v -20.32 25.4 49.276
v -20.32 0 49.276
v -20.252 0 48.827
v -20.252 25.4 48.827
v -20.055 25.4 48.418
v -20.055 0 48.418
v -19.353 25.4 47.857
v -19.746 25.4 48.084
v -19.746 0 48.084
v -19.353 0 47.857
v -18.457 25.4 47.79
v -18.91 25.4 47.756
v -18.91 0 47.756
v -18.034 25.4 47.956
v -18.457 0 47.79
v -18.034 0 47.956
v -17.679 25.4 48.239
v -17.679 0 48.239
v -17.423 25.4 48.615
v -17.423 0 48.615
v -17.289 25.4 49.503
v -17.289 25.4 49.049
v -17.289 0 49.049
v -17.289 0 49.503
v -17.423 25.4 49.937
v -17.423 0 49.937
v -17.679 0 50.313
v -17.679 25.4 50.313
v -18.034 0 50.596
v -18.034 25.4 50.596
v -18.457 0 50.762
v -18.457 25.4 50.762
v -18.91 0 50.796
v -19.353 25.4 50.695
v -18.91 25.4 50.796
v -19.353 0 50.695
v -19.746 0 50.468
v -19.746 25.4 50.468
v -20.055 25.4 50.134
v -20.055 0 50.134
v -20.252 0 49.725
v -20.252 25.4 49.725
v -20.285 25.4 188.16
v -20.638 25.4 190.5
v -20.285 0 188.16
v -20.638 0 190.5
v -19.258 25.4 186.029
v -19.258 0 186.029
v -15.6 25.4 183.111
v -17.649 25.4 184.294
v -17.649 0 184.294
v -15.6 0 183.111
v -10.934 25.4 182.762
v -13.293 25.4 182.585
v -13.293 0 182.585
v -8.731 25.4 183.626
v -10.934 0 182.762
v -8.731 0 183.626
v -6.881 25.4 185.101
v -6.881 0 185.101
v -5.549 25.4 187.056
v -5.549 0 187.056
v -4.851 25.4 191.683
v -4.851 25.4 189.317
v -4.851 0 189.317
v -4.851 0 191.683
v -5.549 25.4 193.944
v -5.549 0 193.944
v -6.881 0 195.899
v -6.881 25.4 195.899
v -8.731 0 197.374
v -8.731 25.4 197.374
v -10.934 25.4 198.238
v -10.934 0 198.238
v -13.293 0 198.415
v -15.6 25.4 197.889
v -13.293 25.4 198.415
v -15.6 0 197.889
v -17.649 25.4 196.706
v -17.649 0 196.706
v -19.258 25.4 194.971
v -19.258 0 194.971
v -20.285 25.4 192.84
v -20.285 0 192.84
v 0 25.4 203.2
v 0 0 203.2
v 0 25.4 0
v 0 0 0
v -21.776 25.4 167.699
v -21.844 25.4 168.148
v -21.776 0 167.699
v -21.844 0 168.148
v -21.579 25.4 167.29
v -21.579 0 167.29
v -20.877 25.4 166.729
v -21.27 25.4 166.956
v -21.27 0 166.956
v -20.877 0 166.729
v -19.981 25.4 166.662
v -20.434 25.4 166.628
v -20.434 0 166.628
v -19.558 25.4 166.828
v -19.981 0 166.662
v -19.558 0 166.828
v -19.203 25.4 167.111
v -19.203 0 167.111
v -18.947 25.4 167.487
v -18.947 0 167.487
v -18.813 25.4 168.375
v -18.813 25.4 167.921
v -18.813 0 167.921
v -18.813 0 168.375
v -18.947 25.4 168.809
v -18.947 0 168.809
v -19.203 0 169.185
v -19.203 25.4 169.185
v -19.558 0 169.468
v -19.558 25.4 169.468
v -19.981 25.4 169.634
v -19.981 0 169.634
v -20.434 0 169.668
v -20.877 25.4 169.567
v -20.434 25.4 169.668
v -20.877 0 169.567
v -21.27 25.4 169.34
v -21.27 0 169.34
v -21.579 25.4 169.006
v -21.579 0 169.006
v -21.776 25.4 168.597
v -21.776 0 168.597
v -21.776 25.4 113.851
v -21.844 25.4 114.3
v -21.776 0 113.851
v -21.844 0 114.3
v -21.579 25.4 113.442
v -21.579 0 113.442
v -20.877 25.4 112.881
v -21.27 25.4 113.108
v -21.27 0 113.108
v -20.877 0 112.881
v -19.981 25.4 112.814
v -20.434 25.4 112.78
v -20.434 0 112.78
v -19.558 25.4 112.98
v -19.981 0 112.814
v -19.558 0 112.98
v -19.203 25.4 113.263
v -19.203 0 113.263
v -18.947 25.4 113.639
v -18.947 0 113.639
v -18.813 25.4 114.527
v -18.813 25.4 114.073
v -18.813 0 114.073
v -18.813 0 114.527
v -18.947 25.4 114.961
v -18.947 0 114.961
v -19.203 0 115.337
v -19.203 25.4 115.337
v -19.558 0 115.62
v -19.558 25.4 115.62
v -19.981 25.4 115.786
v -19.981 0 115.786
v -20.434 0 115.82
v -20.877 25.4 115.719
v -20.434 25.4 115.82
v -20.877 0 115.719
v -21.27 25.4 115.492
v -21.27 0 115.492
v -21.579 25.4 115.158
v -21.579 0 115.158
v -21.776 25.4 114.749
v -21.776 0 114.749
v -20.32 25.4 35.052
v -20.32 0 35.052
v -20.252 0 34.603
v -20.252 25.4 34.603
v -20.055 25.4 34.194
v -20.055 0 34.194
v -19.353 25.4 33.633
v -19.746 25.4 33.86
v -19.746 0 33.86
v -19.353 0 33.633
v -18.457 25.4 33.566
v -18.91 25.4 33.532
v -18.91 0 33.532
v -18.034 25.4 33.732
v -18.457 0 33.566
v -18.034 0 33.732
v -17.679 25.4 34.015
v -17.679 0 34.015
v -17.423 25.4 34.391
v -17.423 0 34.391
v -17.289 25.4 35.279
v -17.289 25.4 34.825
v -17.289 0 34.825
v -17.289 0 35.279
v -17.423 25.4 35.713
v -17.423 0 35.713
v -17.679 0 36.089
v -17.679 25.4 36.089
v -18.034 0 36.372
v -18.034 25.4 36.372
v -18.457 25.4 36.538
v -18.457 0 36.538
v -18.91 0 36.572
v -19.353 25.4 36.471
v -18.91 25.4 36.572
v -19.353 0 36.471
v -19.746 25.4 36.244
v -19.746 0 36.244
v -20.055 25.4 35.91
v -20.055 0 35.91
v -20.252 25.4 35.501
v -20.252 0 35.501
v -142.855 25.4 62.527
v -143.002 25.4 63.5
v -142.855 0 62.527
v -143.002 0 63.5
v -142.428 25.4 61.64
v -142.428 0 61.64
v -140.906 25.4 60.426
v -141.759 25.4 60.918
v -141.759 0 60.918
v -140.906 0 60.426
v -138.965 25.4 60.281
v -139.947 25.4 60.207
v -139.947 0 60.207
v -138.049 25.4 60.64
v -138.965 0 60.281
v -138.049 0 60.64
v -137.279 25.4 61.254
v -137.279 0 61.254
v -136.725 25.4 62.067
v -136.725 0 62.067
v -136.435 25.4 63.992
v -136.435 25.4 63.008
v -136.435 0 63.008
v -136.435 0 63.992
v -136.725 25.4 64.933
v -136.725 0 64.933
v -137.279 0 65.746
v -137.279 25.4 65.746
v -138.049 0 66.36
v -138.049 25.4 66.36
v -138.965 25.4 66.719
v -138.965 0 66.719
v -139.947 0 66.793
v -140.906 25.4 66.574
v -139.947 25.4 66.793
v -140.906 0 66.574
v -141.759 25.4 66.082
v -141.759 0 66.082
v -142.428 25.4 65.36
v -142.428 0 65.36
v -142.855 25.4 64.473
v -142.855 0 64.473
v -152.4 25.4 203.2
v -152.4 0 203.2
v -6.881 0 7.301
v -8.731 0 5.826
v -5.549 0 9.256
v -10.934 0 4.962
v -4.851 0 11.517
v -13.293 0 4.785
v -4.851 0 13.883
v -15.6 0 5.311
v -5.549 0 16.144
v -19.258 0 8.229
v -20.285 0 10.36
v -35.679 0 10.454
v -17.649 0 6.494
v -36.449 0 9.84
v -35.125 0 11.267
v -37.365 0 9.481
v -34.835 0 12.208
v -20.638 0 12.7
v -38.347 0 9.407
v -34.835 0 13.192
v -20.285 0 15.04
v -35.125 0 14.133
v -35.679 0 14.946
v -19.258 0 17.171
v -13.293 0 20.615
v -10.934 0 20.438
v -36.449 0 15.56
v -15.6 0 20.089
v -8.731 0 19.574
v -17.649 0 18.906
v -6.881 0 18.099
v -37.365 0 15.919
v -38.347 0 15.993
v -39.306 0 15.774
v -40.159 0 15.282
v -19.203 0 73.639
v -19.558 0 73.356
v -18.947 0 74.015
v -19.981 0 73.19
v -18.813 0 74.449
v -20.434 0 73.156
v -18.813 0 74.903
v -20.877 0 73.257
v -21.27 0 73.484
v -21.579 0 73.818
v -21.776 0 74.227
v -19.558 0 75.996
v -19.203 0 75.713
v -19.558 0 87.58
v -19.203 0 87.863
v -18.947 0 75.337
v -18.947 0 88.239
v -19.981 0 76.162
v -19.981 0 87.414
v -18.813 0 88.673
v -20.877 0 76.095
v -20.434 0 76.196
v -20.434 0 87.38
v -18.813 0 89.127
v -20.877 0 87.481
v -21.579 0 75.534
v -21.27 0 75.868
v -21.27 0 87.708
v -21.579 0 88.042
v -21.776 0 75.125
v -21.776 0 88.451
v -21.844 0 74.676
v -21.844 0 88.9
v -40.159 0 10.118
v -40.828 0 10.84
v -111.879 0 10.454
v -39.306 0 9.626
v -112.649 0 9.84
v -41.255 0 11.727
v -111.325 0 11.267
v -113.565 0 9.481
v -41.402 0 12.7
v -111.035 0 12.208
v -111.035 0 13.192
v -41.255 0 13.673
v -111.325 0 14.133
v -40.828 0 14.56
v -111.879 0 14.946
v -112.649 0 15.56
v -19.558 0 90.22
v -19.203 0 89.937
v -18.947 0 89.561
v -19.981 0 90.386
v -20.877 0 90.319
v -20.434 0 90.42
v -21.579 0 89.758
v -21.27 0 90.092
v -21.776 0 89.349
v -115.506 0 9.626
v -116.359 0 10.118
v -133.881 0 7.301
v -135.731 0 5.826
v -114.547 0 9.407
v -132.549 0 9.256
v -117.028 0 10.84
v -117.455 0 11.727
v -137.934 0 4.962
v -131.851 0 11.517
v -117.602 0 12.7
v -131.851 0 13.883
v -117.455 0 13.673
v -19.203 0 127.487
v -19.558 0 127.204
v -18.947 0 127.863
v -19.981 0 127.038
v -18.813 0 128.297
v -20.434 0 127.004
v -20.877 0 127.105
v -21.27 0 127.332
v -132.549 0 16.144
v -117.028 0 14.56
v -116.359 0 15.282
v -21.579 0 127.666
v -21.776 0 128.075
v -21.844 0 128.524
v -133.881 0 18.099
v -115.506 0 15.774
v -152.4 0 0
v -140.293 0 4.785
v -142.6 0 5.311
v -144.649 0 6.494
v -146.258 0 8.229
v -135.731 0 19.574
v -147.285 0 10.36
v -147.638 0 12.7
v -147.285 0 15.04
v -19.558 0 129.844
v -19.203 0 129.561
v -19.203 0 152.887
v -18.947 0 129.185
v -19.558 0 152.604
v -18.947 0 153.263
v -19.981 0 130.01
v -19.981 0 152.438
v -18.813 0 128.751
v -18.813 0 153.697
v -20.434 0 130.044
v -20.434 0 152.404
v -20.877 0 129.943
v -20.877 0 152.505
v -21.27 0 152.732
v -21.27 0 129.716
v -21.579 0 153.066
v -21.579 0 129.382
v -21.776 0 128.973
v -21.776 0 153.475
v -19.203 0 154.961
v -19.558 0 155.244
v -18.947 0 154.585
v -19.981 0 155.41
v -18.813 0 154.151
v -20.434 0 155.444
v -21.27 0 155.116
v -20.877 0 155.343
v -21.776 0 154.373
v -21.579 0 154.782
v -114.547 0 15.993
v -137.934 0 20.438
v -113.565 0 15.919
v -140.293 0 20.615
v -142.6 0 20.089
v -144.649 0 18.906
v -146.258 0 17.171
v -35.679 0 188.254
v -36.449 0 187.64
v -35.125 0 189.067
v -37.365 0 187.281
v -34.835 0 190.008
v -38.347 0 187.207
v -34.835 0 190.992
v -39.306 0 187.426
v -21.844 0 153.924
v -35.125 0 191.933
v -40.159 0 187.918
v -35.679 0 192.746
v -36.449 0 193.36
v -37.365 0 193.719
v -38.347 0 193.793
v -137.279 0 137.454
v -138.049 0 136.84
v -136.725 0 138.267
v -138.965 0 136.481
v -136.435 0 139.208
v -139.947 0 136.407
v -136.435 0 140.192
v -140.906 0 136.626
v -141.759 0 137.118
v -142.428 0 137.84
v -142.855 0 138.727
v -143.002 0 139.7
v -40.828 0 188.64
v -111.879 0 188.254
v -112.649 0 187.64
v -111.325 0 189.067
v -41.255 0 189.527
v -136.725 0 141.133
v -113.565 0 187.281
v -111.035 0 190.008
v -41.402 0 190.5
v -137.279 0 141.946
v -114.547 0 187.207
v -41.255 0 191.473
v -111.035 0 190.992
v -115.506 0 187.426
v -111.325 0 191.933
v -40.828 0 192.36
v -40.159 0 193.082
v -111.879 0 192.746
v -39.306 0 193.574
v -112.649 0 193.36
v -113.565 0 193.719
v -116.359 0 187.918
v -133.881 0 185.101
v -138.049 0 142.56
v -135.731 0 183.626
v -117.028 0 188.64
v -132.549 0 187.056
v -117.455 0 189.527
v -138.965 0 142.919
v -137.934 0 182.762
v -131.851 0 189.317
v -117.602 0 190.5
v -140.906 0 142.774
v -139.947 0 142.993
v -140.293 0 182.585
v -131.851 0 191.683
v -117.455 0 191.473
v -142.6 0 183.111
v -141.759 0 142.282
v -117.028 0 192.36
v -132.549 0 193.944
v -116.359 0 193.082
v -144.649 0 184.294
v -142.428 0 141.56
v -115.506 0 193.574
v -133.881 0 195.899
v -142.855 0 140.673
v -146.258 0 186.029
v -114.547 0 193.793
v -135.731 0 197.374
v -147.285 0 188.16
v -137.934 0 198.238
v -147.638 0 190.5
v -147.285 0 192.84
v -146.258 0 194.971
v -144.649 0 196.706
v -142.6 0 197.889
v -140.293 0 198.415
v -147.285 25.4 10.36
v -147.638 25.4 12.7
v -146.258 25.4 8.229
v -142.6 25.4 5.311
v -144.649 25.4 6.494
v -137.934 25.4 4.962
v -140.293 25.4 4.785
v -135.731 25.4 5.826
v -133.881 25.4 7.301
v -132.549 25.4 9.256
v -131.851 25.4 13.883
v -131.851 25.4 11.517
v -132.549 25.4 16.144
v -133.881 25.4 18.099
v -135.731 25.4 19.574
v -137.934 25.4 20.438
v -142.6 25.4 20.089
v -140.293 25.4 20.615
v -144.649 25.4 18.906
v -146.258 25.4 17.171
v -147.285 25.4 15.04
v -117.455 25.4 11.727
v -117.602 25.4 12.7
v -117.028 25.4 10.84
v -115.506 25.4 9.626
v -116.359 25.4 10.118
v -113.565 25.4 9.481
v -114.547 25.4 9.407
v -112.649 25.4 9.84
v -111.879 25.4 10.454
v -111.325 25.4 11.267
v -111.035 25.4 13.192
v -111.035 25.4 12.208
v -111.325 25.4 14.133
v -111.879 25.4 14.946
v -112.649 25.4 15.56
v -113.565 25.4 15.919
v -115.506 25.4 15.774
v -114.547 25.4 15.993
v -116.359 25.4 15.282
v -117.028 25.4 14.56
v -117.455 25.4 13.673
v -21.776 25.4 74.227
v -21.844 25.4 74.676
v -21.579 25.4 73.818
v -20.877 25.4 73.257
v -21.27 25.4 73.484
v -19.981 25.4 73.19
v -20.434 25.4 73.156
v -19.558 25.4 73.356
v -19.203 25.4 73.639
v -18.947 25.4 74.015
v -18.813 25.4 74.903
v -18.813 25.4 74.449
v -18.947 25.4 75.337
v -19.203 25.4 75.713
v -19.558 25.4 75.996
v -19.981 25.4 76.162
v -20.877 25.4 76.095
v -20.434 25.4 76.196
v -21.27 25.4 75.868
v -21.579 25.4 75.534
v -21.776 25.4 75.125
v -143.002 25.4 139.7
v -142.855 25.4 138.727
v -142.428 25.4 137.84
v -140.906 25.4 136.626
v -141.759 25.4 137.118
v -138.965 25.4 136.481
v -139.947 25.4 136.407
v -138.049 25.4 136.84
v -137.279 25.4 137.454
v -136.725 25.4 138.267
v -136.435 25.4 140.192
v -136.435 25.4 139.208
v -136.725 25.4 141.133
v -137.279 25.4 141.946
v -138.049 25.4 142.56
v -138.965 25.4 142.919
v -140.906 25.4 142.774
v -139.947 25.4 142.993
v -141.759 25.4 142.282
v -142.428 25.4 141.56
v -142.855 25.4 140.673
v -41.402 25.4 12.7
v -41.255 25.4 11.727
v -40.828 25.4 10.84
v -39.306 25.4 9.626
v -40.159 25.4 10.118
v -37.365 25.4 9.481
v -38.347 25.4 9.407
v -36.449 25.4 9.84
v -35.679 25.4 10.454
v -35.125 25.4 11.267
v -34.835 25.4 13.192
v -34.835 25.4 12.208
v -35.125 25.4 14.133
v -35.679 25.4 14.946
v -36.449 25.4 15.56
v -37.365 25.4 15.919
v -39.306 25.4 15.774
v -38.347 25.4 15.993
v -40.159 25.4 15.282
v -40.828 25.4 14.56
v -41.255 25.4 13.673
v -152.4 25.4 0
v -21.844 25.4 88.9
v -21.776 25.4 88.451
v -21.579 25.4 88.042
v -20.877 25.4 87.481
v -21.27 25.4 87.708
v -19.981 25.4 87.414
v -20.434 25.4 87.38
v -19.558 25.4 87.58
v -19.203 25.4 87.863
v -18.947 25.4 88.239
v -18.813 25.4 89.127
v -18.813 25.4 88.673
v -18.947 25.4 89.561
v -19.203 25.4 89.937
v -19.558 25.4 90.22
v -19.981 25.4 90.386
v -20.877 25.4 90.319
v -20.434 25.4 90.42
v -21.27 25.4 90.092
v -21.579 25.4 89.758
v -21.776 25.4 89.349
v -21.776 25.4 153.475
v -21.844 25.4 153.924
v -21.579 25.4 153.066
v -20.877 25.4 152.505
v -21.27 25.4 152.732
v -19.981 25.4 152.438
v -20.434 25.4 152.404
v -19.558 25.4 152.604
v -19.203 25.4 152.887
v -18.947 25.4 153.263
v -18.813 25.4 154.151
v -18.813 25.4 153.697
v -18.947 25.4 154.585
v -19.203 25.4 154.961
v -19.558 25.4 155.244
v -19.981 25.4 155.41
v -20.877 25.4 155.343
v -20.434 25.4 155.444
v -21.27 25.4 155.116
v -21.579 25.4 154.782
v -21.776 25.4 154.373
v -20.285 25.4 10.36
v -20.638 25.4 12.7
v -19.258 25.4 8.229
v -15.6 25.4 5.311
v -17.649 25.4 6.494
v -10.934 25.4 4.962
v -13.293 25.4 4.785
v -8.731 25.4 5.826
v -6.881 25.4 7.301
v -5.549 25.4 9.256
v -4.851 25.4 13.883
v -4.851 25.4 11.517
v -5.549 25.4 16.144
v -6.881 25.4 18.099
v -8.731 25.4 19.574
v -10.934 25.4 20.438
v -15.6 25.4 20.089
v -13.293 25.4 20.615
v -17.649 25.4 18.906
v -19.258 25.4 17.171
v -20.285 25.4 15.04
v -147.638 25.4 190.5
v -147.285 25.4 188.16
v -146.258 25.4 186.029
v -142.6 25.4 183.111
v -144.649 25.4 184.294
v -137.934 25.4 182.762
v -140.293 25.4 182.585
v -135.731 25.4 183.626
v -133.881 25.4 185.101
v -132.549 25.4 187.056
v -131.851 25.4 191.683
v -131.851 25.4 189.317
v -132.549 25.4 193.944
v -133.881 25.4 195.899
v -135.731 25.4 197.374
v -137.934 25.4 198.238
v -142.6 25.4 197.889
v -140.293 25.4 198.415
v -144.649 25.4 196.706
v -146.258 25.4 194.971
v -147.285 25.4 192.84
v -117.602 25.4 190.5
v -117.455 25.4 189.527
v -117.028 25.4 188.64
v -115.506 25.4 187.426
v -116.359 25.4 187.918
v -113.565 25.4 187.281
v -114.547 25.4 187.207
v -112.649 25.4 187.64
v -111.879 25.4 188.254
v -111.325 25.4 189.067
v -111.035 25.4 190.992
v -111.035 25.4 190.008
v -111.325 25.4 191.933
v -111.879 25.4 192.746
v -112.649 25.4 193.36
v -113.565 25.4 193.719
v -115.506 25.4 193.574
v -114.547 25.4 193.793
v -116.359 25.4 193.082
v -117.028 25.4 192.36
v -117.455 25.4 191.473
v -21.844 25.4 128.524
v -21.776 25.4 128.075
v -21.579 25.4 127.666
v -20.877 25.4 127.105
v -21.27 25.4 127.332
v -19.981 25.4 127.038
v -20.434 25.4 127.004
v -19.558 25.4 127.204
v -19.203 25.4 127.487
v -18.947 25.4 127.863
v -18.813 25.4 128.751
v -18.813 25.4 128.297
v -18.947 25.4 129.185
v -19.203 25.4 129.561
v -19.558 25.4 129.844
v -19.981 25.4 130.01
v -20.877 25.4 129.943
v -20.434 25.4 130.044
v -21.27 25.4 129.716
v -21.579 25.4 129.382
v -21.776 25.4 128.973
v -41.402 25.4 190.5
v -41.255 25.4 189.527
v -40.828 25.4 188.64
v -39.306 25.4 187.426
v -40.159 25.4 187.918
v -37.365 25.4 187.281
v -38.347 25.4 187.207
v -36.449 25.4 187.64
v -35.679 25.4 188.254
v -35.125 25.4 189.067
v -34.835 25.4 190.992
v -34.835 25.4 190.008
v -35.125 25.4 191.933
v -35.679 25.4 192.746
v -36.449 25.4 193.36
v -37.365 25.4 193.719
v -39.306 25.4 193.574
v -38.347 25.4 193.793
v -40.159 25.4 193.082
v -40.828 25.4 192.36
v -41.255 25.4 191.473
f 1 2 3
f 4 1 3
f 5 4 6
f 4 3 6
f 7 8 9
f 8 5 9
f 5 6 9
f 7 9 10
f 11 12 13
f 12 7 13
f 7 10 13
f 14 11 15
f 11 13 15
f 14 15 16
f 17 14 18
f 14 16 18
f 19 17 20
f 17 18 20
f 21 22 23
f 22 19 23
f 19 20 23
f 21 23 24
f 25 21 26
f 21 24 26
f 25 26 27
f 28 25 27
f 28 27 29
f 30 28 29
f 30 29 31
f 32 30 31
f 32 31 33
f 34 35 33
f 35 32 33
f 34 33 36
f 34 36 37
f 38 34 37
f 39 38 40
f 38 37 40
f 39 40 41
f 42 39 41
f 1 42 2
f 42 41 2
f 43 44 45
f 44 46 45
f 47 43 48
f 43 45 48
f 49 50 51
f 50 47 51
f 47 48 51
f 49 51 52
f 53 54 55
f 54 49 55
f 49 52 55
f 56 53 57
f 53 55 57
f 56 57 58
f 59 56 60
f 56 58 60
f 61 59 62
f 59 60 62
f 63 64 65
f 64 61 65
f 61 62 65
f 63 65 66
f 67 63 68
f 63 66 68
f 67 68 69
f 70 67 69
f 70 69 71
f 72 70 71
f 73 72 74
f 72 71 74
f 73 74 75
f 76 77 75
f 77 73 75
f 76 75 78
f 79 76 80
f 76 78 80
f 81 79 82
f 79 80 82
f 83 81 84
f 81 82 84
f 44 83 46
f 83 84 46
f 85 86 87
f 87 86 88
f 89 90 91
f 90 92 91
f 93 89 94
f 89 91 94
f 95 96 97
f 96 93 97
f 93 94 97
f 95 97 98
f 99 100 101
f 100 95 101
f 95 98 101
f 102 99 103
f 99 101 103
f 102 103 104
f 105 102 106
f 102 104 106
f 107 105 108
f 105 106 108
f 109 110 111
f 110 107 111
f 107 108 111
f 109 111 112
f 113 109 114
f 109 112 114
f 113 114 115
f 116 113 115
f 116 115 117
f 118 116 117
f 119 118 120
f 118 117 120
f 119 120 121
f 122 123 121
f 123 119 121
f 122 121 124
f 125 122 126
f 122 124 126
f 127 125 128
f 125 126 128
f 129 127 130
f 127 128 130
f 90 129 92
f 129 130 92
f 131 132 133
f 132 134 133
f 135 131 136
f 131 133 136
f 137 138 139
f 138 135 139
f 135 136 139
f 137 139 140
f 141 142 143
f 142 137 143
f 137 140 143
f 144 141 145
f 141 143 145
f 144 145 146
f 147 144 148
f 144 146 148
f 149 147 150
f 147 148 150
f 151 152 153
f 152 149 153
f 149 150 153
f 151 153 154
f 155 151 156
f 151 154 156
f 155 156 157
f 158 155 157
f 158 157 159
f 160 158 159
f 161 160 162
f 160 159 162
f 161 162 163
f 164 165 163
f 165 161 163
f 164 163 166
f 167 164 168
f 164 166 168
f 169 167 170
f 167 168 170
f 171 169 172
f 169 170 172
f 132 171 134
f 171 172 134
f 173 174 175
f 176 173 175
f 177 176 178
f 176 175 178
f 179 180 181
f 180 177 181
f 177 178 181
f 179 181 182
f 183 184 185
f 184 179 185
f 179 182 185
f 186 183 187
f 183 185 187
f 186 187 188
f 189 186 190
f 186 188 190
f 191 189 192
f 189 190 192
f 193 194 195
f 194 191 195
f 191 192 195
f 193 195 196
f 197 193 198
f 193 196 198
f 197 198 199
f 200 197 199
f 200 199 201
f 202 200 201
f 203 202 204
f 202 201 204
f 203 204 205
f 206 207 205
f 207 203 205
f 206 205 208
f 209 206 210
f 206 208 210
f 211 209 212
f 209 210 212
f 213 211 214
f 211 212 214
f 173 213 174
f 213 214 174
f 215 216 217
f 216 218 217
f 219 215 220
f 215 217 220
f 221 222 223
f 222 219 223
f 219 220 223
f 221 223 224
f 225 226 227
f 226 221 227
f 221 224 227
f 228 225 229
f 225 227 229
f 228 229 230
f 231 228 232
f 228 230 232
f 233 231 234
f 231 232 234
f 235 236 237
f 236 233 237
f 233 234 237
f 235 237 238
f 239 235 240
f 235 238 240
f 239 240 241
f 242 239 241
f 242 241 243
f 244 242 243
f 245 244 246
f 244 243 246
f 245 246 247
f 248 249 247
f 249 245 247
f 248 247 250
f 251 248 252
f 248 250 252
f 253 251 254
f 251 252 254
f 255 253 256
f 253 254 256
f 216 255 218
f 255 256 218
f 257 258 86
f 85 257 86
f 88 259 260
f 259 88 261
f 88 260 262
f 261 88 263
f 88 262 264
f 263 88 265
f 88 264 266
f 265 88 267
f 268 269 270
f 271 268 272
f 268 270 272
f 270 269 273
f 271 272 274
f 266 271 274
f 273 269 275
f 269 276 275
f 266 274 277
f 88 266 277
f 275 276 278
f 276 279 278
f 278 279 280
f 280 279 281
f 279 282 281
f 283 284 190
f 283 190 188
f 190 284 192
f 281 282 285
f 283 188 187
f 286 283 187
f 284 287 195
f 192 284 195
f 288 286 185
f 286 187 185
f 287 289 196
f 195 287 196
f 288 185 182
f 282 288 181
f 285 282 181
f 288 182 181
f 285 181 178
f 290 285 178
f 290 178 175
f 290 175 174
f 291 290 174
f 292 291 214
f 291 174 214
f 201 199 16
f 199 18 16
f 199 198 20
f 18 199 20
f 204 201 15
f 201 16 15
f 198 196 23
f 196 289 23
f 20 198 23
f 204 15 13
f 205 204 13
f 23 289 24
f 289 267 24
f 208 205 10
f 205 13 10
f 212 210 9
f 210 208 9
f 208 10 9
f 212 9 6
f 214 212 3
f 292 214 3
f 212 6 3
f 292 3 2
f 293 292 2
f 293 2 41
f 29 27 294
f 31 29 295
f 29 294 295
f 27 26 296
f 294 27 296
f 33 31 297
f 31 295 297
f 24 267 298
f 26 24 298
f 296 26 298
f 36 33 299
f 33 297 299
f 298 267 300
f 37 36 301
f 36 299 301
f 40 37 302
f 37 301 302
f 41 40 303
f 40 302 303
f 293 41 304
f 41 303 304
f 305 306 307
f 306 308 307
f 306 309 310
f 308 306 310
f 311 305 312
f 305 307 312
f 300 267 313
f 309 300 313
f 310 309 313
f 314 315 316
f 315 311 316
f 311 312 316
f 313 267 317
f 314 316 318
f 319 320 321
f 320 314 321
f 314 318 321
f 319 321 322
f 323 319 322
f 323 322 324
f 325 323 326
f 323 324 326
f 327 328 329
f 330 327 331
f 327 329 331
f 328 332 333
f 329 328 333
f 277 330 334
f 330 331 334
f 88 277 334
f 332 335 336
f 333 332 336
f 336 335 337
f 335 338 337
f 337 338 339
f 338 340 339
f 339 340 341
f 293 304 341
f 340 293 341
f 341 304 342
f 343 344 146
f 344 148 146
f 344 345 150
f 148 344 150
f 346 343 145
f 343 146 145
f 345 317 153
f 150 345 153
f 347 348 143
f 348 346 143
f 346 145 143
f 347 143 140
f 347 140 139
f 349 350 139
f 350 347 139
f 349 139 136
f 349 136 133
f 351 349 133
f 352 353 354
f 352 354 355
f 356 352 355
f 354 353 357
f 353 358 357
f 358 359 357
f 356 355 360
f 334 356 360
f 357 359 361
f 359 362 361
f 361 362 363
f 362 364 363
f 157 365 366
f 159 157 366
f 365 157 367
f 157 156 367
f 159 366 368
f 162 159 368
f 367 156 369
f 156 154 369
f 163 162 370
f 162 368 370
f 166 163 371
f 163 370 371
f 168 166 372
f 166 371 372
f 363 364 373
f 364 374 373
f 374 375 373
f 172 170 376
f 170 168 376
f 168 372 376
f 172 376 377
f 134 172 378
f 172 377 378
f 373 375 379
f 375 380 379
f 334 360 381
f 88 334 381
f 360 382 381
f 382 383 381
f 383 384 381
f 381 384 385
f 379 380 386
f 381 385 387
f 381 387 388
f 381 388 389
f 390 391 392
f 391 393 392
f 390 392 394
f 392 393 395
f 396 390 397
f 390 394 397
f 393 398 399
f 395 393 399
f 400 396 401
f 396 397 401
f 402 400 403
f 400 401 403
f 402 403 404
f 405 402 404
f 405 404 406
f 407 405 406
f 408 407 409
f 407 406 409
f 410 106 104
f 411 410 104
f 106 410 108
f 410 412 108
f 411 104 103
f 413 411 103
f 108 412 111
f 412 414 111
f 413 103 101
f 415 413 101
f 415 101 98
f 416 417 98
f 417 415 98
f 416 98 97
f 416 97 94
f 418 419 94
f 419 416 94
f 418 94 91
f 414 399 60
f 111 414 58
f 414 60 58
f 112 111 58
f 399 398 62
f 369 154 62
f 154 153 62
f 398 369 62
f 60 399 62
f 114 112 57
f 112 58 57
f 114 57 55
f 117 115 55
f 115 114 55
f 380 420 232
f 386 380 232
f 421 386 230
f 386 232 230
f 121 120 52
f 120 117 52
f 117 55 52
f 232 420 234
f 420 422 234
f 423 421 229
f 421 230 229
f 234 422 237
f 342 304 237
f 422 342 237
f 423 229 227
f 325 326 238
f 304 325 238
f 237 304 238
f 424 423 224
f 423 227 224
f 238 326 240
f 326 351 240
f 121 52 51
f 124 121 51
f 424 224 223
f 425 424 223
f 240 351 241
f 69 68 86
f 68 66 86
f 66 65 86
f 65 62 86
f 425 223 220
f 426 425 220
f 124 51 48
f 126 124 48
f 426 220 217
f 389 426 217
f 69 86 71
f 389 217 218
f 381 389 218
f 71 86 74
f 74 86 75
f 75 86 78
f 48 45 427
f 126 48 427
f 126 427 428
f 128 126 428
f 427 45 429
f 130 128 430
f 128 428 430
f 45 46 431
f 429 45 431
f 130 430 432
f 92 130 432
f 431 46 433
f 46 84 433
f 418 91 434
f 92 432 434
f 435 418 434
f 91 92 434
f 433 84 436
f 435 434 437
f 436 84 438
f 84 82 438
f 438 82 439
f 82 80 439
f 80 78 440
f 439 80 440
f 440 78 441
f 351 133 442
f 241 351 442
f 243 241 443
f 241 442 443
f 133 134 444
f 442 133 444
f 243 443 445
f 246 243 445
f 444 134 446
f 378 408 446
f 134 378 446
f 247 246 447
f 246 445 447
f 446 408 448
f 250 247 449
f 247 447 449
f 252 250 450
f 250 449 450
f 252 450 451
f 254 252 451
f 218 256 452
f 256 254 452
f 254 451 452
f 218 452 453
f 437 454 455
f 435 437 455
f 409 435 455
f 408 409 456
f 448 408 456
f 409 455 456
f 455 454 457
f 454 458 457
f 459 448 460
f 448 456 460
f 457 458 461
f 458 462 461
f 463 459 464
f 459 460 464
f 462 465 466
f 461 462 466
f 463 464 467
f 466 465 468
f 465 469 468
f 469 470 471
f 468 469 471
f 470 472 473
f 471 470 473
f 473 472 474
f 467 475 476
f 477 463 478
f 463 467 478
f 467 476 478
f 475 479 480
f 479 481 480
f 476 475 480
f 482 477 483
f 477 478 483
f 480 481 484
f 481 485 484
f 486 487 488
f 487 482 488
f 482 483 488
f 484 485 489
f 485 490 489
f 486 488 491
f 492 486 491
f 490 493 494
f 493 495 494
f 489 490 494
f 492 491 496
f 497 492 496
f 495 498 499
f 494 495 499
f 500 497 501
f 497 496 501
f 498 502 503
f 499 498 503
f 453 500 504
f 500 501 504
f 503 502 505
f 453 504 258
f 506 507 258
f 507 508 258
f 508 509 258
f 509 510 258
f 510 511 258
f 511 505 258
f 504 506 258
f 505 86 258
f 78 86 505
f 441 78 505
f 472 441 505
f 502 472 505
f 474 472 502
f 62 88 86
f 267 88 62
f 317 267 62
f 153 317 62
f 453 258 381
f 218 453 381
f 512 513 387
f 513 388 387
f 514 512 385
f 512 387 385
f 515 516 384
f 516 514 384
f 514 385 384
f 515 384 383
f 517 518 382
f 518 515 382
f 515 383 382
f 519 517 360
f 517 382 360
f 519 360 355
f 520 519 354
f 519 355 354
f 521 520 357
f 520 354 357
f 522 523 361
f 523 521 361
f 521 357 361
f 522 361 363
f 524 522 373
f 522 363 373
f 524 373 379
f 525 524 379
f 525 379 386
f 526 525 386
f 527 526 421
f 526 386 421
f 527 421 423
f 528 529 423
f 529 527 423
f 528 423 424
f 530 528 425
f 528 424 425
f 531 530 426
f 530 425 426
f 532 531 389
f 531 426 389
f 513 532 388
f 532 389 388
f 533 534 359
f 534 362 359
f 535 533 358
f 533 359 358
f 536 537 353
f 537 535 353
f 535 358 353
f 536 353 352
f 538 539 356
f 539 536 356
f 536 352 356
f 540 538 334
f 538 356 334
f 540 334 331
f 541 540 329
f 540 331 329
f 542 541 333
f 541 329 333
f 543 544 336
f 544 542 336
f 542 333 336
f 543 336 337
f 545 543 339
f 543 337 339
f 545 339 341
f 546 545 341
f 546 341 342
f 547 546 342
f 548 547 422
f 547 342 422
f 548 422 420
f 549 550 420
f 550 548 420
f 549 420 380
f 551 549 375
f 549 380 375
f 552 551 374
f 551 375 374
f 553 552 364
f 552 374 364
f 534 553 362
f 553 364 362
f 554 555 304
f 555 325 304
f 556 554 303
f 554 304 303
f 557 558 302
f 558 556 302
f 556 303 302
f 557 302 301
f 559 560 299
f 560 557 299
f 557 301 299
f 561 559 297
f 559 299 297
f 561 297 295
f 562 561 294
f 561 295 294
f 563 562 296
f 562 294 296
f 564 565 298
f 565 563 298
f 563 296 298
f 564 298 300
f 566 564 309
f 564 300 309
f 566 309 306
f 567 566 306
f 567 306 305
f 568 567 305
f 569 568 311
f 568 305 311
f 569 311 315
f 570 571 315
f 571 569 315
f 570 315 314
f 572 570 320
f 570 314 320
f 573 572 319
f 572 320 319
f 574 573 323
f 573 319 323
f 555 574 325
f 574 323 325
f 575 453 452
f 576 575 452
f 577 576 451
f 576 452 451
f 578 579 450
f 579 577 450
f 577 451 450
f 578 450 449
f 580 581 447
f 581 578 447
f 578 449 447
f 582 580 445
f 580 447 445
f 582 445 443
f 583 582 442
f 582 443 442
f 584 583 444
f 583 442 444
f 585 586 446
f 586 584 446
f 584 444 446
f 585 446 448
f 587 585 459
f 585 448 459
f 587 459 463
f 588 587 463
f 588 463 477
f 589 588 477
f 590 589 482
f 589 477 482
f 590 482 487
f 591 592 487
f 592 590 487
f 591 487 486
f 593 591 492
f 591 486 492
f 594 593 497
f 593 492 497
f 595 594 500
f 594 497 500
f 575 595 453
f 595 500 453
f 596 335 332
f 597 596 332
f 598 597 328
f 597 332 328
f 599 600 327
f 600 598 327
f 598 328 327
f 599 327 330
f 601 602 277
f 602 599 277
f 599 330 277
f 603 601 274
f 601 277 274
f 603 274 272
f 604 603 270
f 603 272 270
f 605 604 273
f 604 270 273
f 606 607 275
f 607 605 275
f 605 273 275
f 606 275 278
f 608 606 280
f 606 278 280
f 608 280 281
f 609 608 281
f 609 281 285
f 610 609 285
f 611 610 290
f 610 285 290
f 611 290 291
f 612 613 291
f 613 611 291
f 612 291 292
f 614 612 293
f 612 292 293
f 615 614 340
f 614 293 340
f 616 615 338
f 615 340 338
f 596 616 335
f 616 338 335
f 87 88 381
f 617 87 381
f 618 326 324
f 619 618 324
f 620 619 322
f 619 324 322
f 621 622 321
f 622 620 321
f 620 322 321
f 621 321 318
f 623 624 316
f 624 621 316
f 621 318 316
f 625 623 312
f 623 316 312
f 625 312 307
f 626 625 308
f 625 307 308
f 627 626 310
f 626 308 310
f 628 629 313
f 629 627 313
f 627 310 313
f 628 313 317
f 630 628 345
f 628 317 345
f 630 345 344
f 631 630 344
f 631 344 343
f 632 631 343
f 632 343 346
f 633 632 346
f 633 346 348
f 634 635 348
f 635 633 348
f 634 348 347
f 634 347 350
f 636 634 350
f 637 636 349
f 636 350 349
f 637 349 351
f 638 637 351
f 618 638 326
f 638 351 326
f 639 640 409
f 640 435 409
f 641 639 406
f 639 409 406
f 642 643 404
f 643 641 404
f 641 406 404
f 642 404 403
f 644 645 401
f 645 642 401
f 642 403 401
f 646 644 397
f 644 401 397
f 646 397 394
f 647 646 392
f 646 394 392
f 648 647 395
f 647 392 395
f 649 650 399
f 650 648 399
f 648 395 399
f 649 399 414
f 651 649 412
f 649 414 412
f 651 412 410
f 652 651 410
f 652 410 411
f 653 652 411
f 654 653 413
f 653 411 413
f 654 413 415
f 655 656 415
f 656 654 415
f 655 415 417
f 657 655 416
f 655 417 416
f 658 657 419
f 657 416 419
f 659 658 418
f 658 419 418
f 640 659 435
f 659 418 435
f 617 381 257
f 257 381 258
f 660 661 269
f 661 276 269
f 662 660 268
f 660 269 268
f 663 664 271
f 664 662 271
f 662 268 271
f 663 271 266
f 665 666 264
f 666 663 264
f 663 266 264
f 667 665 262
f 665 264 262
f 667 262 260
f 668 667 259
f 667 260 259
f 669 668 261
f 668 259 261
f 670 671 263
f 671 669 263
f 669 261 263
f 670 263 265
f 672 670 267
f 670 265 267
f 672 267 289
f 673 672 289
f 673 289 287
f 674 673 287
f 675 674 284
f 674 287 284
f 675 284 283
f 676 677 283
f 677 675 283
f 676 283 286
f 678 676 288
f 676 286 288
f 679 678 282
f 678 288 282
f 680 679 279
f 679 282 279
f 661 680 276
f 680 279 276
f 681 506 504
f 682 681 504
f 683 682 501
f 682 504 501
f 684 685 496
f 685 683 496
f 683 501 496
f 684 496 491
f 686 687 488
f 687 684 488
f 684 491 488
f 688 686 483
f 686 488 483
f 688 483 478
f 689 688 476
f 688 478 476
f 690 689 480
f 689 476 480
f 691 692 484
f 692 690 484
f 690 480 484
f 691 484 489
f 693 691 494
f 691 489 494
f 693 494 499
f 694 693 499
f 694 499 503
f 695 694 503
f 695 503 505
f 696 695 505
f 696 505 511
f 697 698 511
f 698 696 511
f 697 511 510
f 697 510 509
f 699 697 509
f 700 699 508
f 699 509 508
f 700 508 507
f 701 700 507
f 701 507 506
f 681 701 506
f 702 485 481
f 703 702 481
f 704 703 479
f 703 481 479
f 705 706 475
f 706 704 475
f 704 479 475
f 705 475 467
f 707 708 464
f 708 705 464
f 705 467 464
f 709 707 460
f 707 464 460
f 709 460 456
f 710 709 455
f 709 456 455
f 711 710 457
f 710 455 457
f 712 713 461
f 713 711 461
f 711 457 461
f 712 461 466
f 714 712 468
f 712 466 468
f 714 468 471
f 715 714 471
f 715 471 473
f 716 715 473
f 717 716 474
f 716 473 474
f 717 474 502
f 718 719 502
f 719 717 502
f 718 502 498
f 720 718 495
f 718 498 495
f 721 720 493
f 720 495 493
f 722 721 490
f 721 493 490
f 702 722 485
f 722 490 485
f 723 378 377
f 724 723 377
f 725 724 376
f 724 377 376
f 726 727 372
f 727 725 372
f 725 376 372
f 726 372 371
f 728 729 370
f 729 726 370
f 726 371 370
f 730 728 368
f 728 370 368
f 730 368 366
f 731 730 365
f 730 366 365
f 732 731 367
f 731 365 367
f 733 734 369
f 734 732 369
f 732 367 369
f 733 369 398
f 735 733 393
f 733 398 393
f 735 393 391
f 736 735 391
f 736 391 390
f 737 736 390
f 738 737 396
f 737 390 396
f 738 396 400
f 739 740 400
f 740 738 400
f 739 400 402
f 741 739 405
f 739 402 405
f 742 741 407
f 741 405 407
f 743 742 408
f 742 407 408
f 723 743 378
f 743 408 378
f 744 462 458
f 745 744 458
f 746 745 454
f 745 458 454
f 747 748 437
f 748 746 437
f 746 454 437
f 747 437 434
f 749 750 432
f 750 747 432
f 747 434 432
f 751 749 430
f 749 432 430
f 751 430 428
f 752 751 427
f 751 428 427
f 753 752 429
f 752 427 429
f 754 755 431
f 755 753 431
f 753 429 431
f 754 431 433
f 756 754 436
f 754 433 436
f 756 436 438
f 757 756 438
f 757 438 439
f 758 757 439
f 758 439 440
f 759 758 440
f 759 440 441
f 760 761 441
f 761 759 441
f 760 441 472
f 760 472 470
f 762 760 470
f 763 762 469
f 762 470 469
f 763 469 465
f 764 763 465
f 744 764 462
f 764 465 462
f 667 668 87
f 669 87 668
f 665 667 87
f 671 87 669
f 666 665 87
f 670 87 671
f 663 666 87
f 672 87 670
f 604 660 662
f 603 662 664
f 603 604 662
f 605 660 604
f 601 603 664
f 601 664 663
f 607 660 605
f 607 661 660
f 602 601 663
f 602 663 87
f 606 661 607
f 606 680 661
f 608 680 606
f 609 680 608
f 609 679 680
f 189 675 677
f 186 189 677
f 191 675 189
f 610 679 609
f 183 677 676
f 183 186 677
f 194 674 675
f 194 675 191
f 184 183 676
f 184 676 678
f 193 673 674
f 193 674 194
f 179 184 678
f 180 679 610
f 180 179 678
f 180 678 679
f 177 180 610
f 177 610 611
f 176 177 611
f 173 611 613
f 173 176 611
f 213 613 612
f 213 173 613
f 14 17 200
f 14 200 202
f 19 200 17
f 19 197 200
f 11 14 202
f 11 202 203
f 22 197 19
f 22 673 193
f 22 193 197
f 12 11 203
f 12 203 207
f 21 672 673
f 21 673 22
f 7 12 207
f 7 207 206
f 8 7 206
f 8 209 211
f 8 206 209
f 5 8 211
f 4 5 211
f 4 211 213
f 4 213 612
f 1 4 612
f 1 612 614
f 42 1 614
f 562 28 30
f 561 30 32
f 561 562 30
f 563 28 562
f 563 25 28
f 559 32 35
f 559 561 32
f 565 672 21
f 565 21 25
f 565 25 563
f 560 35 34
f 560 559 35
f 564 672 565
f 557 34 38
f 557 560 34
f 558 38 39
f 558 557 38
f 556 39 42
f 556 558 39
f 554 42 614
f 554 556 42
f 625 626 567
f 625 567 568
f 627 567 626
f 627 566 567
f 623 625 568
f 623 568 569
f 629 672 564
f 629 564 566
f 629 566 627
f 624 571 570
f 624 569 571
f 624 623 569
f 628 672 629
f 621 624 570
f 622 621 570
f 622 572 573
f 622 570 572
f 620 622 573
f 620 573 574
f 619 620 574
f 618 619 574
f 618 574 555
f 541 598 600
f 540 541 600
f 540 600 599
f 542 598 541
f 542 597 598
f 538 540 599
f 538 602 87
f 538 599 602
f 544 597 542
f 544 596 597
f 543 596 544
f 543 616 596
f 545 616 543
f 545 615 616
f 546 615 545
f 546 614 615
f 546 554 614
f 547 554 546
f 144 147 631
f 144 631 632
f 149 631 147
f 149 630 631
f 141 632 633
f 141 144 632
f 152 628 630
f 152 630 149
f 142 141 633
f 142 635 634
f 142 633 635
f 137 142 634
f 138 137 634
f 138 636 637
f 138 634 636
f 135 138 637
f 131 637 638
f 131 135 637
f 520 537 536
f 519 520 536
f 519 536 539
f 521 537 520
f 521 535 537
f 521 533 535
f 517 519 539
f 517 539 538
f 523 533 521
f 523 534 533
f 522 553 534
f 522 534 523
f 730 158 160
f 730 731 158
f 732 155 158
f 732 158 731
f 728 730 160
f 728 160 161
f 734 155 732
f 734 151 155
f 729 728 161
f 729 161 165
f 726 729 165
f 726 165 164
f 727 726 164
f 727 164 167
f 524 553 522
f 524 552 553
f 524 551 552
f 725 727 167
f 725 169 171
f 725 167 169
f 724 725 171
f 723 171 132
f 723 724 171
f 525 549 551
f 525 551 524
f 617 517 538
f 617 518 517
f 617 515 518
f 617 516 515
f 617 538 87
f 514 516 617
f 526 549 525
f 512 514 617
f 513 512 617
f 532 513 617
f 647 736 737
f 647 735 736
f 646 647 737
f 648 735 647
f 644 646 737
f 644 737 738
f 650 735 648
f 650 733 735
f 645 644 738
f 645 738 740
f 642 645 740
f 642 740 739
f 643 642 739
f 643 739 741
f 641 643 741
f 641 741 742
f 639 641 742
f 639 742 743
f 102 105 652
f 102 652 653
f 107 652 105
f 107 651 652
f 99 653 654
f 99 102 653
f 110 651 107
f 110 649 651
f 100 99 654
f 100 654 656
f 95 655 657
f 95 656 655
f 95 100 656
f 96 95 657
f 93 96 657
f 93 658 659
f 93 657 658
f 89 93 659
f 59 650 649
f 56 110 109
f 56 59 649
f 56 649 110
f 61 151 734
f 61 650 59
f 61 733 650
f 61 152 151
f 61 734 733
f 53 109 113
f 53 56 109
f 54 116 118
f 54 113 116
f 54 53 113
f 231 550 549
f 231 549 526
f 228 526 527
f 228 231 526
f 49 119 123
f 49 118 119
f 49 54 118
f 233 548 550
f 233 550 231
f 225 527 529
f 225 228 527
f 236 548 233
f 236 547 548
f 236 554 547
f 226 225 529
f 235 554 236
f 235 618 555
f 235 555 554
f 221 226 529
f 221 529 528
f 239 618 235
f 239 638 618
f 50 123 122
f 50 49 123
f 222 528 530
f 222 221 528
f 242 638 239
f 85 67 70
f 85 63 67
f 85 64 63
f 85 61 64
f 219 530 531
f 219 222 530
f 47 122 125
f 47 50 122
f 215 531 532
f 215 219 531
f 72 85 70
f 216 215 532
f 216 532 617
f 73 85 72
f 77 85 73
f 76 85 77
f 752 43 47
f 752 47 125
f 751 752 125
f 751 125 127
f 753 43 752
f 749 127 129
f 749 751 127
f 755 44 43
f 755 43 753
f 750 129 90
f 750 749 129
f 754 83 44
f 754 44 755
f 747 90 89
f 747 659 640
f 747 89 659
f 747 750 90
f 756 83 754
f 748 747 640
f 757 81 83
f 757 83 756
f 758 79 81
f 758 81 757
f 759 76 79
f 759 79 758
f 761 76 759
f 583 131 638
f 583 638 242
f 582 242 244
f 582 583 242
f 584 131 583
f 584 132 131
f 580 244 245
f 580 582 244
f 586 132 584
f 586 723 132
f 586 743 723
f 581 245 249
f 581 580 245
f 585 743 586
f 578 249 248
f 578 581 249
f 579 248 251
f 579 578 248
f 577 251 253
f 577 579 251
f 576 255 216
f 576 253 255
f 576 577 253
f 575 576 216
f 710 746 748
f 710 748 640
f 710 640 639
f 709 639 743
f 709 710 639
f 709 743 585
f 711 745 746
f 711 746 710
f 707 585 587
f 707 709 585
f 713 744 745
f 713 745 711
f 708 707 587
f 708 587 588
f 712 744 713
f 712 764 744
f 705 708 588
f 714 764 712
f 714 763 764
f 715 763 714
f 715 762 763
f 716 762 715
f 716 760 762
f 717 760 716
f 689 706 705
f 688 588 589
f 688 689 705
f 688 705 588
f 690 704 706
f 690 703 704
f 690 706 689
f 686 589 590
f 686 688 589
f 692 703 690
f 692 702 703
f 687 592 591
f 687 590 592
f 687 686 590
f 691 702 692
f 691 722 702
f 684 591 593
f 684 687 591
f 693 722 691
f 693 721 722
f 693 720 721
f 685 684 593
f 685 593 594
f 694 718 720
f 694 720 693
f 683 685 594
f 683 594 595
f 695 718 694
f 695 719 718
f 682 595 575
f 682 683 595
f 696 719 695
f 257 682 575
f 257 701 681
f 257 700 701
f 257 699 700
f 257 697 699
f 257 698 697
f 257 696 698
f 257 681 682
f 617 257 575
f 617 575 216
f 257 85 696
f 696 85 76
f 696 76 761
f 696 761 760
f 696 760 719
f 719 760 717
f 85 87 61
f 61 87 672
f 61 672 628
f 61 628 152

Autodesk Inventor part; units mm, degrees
ref_plane "YZ Plane" through (0, 0, 0) normal (1, 0, 0) x (0, 1, 0)
ref_plane "XZ Plane" through (0, 0, 0) normal (0, 1, 0) x (-1, 0, 0)
ref_plane "XY Plane" through (0, 0, 0) normal (0, 0, 1) x (1, 0, 0)
sketch "Sketch1" plane through (0, 0, 0) normal (0, 1, 0) x (-1, 0, 0)
  line L0 (0, 0) -> (152.4, 0)
  line L1 (152.4, 0) -> (152.4, 203.2)
  line L2 (152.4, 203.2) -> (0, 203.2)
  line L3 (0, 203.2) -> (0, 0)
  circle A0 centre (12.7, 190.5) radius 7.9375
  circle A1 centre (139.7, 190.5) radius 7.9375
  circle A2 centre (139.7, 12.7) radius 7.9375
  circle A3 centre (12.7, 12.7) radius 7.9375
  circle A4 centre (114.3, 190.5) radius 3.302
  circle A5 centre (38.1, 190.5) radius 3.302
  circle A6 centre (114.3, 12.7) radius 3.302
  circle A7 centre (38.1, 12.7) radius 3.302
  circle A8 centre (139.7, 139.7) radius 3.302
  circle A9 centre (139.7, 63.5) radius 3.302
  circle A10 centre (20.32, 168.148) radius 1.524
  circle A11 centre (20.32, 153.924) radius 1.524
  circle A12 centre (20.32, 128.524) radius 1.524
  circle A13 centre (20.32, 114.3) radius 1.524
  circle A14 centre (20.32, 88.9) radius 1.524
  circle A15 centre (20.32, 74.676) radius 1.524
  circle A16 centre (18.796, 49.276) radius 1.524
  circle A17 centre (18.796, 35.052) radius 1.524
  dimension "d0" = 152.4
  dimension "d1" = 203.2
  dimension "d40" = 15.875
  dimension "d41" = 15.875
  dimension "d42" = 15.875
  dimension "d43" = 15.875
  dimension "d44" = 12.7
  dimension "d45" = 12.7
  dimension "d46" = 12.7
  dimension "d47" = 12.7
  dimension "d48" = 12.7
  dimension "d49" = 12.7
  dimension "d50" = 12.7
  dimension "d51" = 12.7
  dimension "d52" = 177.8
  dimension "d53" = 127
  dimension "d54" = 6.604
  dimension "d55" = 6.604
  dimension "d56" = 25.4
  dimension "d57" = 25.4
  dimension "d58" = 12.7
  dimension "d59" = 12.7
  dimension "d60" = 6.604
  dimension "d61" = 6.604
  dimension "d62" = 12.7
  dimension "d63" = 12.7
  dimension "d64" = 25.4
  dimension "d65" = 25.4
  dimension "d66" = 6.604
  dimension "d67" = 6.604
  dimension "d68" = 50.8
  dimension "d69" = 50.8
  dimension "d70" = 12.7
  dimension "d71" = 12.7
  dimension "d72" = 3.048
  dimension "d73" = 3.048
  dimension "d74" = 3.048
  dimension "d75" = 3.048
  dimension "d76" = 3.048
  dimension "d77" = 3.048
  dimension "d78" = 20.32
  dimension "d79" = 20.32
  dimension "d80" = 20.32
  dimension "d81" = 20.32
  dimension "d82" = 20.32
  dimension "d83" = 20.32
  dimension "d84" = 22.352
  dimension "d85" = 14.224
  dimension "d86" = 25.4
  dimension "d87" = 14.224
  dimension "d88" = 25.4
  dimension "d89" = 14.224
  dimension "d90" = 3.048
  dimension "d91" = 3.048
  dimension "d92" = 25.4
  dimension "d93" = 14.224
extrude "Extrusion2" add sketch "Sketch1" along normal blind 25.4
properties part number "CasingBottomWithSlots"
